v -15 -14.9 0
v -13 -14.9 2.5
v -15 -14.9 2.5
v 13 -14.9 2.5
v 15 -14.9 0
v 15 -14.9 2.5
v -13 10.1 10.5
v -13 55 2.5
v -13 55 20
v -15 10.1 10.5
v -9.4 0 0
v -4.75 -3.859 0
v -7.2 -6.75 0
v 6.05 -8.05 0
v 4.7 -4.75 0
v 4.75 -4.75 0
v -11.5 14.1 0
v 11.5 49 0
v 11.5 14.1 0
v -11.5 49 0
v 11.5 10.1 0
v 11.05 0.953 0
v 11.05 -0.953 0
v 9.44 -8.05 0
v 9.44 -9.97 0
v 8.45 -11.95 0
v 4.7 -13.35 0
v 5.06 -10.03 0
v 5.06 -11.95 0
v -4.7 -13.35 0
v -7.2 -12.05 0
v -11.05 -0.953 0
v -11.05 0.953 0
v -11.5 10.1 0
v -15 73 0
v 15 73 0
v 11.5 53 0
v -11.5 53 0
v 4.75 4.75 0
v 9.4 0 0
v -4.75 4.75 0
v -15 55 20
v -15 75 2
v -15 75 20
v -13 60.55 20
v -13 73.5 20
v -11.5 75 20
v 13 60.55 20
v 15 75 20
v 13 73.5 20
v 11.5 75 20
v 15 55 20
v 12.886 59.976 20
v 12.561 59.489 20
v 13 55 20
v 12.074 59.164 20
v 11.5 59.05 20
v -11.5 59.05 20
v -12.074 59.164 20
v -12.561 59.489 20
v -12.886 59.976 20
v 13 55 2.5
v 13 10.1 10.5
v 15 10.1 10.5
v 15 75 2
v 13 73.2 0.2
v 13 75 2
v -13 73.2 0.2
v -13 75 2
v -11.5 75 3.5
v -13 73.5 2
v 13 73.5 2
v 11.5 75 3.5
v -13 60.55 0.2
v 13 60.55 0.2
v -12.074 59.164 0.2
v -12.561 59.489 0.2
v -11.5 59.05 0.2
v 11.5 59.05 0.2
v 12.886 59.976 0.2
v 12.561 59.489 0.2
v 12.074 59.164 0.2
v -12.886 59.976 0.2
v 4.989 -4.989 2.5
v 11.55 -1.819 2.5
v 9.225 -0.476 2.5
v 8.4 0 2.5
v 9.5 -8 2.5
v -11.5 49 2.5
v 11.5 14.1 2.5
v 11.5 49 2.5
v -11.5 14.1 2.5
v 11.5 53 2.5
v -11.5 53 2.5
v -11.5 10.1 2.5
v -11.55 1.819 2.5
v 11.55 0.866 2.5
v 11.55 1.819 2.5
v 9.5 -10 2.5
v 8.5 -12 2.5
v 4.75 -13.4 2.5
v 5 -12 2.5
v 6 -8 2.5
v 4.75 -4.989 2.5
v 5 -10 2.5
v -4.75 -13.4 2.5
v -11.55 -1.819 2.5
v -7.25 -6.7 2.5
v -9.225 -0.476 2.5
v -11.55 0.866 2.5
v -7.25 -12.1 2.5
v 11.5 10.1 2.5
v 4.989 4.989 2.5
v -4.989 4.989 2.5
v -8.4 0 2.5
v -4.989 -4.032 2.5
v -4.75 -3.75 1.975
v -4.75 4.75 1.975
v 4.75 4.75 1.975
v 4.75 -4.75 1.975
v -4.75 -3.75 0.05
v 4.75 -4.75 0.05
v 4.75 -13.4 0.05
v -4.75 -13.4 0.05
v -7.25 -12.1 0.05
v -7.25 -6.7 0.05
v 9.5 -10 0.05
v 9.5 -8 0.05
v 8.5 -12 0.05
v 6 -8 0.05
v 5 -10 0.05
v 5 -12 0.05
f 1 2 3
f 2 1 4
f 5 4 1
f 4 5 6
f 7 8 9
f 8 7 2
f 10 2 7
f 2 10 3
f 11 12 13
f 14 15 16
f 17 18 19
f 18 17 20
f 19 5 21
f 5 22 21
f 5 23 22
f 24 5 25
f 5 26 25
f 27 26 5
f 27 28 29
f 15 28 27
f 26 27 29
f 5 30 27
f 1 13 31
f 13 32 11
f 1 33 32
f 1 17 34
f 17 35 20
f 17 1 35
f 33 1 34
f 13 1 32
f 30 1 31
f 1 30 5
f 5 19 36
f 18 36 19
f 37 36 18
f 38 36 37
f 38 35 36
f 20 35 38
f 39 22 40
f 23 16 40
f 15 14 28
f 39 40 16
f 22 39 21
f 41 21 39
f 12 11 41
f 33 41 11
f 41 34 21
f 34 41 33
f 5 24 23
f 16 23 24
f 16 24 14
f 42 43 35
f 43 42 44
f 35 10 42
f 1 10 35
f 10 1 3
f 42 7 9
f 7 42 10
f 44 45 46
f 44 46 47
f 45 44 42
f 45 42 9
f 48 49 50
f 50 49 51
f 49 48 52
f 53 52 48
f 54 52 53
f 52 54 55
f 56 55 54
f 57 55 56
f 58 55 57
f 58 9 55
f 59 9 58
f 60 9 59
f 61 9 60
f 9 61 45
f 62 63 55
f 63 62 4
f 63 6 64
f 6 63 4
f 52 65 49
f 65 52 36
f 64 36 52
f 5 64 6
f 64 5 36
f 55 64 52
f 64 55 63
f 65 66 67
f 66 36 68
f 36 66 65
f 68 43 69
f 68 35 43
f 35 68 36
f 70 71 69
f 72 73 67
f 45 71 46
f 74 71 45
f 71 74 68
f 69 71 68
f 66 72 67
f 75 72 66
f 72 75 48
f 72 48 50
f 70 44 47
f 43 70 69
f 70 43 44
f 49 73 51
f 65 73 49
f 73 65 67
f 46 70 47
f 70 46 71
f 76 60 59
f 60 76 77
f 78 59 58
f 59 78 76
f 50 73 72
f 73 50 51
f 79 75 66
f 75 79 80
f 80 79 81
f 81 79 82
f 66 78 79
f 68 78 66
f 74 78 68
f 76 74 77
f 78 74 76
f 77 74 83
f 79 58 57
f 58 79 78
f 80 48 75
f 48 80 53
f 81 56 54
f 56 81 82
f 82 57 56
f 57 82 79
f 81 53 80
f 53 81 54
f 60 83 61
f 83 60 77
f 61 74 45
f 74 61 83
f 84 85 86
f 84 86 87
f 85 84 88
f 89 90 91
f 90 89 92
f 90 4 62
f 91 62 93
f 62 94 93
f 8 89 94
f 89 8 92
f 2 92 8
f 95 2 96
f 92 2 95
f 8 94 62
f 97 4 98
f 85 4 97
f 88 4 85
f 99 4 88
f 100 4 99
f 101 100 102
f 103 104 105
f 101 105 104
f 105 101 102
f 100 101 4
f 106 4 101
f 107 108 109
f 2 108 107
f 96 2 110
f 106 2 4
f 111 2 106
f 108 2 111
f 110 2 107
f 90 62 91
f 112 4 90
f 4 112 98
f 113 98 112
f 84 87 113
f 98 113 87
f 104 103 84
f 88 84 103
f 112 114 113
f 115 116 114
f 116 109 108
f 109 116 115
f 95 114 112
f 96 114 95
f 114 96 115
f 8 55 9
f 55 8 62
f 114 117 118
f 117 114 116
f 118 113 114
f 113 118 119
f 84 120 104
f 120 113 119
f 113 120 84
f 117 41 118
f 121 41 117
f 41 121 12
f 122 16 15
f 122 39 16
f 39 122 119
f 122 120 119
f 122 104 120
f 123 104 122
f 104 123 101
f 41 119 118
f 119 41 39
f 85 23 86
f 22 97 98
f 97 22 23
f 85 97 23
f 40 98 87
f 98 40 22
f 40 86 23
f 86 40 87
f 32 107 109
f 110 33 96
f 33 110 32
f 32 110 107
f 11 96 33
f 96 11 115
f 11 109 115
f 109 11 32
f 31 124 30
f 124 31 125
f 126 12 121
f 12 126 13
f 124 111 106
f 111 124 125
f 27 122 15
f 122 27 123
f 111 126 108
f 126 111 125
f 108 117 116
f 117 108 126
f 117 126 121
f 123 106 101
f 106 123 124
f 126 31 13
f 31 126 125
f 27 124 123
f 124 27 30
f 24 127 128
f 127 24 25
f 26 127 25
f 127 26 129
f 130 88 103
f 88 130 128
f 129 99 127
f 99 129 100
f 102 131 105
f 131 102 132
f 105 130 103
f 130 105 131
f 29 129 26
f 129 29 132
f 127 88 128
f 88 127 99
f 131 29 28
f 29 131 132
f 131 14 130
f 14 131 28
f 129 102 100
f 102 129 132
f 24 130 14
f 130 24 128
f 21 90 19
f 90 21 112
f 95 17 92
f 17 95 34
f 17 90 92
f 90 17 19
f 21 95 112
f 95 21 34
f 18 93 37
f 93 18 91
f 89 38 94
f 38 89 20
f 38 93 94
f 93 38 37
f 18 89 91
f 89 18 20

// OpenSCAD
// file: parameters.scad
/*
OpenFlexure Dissection Microscope: Parameters

These variables set the geometry of the microscope.
*/

// Geometry of the mounting post
front_dovetail_y = 75; // position of the main dovetail
front_dovetail_w = 30; // width of the main dovetail
post_h = 75; // height of the post (working distance + clip_h)
mounting_holes = [[25,0,0],[-25,0,0],[0,25,0]]; // location of mounting bolts

// Geometry of the camera mount

// Illumination
illumination_arm_l = 35.6;
// NB illumination arm places the LED 35.6mm from the mounting hole.

d = 0.05;
// main file
/******************************************************************
*                                                                 *
* OpenFlexure Dissection Microscope: Microscope body              *
*                                                                 *
* This is the chassis of the OpenFlexure microscope, an open      *
* microscope and 3-axis translation stage.  It gets really good   *
* precision over a ~10mm range, by using plastic flexure          *
* mechanisms.                                                     *
*                                                                 *
* (c) Richard Bowman, January 2016                                *
* Released under the CERN Open Hardware License                   *
*                                                                 *
******************************************************************/

use <./utilities.scad>;
use <./compact_nut_seat.scad>;
use <./dovetail.scad>;
use <./cameras/picamera_2.scad>;
include <./parameters.scad>;

camera_pcb = [25, 25];
wall_t = 2;
w = camera_pcb[0] + 1 + 4;
starty = -camera_pcb[1]/2-2.4; //edge of the PCB
lens_h = 2.5; //thickness of the camera mount plate (lens pokes through this)
dt_clip = [front_dovetail_w, 16, 20]; //size of the dovetail clip
arm_end_y = front_dovetail_y-dt_clip[1]-4;

difference(){
    union(){
        // plate that the camera sits on
        translate([-w/2, starty,0]) cube([w,camera_pcb[1]+5,lens_h]);
        
        // walls either side for stiffness
        reflect([1,0,0]) sequential_hull(){
            translate([-w/2, starty,0]) cube([wall_t, wall_t, lens_h]);
            translate([-w/2, starty + camera_pcb[1],0]) cube([wall_t, wall_t, lens_h + 8]);
            translate([-dt_clip[0]/2, arm_end_y,0]) cube([wall_t, wall_t, dt_clip[2]]);
        }
        
        // add a bottom
        hull() reflect([1,0,0]){
            translate([-w/2, starty + camera_pcb[1],0]) cube([wall_t, wall_t, lens_h]);
            translate([-dt_clip[0]/2, arm_end_y,0]) cube([wall_t, wall_t, lens_h]);
        }
        
        // mount for the dovetail clip
        translate([-dt_clip[0]/2,arm_end_y,0]) cube([dt_clip[0], 4, dt_clip[2]]);
        
        // the dovetail clip
        translate([0,front_dovetail_y, 0]) mirror([0,1,0]) dovetail_clip(dt_clip, slope_front=2, solid_bottom=0.2);
    }
    
    
    
    // mount for the camera
    translate([0,0,lens_h]) rotate([180,0,0]) picam2_cutout();
    
    // pass-through hole for the camera flex in case it's needed
    translate([0,starty + camera_pcb[1] + 2]) cube([camera_pcb[0] - 2, 4, 999],center=true);
    translate([0,arm_end_y -4]) cube([camera_pcb[0] - 2, 4, 999],center=true);
}
